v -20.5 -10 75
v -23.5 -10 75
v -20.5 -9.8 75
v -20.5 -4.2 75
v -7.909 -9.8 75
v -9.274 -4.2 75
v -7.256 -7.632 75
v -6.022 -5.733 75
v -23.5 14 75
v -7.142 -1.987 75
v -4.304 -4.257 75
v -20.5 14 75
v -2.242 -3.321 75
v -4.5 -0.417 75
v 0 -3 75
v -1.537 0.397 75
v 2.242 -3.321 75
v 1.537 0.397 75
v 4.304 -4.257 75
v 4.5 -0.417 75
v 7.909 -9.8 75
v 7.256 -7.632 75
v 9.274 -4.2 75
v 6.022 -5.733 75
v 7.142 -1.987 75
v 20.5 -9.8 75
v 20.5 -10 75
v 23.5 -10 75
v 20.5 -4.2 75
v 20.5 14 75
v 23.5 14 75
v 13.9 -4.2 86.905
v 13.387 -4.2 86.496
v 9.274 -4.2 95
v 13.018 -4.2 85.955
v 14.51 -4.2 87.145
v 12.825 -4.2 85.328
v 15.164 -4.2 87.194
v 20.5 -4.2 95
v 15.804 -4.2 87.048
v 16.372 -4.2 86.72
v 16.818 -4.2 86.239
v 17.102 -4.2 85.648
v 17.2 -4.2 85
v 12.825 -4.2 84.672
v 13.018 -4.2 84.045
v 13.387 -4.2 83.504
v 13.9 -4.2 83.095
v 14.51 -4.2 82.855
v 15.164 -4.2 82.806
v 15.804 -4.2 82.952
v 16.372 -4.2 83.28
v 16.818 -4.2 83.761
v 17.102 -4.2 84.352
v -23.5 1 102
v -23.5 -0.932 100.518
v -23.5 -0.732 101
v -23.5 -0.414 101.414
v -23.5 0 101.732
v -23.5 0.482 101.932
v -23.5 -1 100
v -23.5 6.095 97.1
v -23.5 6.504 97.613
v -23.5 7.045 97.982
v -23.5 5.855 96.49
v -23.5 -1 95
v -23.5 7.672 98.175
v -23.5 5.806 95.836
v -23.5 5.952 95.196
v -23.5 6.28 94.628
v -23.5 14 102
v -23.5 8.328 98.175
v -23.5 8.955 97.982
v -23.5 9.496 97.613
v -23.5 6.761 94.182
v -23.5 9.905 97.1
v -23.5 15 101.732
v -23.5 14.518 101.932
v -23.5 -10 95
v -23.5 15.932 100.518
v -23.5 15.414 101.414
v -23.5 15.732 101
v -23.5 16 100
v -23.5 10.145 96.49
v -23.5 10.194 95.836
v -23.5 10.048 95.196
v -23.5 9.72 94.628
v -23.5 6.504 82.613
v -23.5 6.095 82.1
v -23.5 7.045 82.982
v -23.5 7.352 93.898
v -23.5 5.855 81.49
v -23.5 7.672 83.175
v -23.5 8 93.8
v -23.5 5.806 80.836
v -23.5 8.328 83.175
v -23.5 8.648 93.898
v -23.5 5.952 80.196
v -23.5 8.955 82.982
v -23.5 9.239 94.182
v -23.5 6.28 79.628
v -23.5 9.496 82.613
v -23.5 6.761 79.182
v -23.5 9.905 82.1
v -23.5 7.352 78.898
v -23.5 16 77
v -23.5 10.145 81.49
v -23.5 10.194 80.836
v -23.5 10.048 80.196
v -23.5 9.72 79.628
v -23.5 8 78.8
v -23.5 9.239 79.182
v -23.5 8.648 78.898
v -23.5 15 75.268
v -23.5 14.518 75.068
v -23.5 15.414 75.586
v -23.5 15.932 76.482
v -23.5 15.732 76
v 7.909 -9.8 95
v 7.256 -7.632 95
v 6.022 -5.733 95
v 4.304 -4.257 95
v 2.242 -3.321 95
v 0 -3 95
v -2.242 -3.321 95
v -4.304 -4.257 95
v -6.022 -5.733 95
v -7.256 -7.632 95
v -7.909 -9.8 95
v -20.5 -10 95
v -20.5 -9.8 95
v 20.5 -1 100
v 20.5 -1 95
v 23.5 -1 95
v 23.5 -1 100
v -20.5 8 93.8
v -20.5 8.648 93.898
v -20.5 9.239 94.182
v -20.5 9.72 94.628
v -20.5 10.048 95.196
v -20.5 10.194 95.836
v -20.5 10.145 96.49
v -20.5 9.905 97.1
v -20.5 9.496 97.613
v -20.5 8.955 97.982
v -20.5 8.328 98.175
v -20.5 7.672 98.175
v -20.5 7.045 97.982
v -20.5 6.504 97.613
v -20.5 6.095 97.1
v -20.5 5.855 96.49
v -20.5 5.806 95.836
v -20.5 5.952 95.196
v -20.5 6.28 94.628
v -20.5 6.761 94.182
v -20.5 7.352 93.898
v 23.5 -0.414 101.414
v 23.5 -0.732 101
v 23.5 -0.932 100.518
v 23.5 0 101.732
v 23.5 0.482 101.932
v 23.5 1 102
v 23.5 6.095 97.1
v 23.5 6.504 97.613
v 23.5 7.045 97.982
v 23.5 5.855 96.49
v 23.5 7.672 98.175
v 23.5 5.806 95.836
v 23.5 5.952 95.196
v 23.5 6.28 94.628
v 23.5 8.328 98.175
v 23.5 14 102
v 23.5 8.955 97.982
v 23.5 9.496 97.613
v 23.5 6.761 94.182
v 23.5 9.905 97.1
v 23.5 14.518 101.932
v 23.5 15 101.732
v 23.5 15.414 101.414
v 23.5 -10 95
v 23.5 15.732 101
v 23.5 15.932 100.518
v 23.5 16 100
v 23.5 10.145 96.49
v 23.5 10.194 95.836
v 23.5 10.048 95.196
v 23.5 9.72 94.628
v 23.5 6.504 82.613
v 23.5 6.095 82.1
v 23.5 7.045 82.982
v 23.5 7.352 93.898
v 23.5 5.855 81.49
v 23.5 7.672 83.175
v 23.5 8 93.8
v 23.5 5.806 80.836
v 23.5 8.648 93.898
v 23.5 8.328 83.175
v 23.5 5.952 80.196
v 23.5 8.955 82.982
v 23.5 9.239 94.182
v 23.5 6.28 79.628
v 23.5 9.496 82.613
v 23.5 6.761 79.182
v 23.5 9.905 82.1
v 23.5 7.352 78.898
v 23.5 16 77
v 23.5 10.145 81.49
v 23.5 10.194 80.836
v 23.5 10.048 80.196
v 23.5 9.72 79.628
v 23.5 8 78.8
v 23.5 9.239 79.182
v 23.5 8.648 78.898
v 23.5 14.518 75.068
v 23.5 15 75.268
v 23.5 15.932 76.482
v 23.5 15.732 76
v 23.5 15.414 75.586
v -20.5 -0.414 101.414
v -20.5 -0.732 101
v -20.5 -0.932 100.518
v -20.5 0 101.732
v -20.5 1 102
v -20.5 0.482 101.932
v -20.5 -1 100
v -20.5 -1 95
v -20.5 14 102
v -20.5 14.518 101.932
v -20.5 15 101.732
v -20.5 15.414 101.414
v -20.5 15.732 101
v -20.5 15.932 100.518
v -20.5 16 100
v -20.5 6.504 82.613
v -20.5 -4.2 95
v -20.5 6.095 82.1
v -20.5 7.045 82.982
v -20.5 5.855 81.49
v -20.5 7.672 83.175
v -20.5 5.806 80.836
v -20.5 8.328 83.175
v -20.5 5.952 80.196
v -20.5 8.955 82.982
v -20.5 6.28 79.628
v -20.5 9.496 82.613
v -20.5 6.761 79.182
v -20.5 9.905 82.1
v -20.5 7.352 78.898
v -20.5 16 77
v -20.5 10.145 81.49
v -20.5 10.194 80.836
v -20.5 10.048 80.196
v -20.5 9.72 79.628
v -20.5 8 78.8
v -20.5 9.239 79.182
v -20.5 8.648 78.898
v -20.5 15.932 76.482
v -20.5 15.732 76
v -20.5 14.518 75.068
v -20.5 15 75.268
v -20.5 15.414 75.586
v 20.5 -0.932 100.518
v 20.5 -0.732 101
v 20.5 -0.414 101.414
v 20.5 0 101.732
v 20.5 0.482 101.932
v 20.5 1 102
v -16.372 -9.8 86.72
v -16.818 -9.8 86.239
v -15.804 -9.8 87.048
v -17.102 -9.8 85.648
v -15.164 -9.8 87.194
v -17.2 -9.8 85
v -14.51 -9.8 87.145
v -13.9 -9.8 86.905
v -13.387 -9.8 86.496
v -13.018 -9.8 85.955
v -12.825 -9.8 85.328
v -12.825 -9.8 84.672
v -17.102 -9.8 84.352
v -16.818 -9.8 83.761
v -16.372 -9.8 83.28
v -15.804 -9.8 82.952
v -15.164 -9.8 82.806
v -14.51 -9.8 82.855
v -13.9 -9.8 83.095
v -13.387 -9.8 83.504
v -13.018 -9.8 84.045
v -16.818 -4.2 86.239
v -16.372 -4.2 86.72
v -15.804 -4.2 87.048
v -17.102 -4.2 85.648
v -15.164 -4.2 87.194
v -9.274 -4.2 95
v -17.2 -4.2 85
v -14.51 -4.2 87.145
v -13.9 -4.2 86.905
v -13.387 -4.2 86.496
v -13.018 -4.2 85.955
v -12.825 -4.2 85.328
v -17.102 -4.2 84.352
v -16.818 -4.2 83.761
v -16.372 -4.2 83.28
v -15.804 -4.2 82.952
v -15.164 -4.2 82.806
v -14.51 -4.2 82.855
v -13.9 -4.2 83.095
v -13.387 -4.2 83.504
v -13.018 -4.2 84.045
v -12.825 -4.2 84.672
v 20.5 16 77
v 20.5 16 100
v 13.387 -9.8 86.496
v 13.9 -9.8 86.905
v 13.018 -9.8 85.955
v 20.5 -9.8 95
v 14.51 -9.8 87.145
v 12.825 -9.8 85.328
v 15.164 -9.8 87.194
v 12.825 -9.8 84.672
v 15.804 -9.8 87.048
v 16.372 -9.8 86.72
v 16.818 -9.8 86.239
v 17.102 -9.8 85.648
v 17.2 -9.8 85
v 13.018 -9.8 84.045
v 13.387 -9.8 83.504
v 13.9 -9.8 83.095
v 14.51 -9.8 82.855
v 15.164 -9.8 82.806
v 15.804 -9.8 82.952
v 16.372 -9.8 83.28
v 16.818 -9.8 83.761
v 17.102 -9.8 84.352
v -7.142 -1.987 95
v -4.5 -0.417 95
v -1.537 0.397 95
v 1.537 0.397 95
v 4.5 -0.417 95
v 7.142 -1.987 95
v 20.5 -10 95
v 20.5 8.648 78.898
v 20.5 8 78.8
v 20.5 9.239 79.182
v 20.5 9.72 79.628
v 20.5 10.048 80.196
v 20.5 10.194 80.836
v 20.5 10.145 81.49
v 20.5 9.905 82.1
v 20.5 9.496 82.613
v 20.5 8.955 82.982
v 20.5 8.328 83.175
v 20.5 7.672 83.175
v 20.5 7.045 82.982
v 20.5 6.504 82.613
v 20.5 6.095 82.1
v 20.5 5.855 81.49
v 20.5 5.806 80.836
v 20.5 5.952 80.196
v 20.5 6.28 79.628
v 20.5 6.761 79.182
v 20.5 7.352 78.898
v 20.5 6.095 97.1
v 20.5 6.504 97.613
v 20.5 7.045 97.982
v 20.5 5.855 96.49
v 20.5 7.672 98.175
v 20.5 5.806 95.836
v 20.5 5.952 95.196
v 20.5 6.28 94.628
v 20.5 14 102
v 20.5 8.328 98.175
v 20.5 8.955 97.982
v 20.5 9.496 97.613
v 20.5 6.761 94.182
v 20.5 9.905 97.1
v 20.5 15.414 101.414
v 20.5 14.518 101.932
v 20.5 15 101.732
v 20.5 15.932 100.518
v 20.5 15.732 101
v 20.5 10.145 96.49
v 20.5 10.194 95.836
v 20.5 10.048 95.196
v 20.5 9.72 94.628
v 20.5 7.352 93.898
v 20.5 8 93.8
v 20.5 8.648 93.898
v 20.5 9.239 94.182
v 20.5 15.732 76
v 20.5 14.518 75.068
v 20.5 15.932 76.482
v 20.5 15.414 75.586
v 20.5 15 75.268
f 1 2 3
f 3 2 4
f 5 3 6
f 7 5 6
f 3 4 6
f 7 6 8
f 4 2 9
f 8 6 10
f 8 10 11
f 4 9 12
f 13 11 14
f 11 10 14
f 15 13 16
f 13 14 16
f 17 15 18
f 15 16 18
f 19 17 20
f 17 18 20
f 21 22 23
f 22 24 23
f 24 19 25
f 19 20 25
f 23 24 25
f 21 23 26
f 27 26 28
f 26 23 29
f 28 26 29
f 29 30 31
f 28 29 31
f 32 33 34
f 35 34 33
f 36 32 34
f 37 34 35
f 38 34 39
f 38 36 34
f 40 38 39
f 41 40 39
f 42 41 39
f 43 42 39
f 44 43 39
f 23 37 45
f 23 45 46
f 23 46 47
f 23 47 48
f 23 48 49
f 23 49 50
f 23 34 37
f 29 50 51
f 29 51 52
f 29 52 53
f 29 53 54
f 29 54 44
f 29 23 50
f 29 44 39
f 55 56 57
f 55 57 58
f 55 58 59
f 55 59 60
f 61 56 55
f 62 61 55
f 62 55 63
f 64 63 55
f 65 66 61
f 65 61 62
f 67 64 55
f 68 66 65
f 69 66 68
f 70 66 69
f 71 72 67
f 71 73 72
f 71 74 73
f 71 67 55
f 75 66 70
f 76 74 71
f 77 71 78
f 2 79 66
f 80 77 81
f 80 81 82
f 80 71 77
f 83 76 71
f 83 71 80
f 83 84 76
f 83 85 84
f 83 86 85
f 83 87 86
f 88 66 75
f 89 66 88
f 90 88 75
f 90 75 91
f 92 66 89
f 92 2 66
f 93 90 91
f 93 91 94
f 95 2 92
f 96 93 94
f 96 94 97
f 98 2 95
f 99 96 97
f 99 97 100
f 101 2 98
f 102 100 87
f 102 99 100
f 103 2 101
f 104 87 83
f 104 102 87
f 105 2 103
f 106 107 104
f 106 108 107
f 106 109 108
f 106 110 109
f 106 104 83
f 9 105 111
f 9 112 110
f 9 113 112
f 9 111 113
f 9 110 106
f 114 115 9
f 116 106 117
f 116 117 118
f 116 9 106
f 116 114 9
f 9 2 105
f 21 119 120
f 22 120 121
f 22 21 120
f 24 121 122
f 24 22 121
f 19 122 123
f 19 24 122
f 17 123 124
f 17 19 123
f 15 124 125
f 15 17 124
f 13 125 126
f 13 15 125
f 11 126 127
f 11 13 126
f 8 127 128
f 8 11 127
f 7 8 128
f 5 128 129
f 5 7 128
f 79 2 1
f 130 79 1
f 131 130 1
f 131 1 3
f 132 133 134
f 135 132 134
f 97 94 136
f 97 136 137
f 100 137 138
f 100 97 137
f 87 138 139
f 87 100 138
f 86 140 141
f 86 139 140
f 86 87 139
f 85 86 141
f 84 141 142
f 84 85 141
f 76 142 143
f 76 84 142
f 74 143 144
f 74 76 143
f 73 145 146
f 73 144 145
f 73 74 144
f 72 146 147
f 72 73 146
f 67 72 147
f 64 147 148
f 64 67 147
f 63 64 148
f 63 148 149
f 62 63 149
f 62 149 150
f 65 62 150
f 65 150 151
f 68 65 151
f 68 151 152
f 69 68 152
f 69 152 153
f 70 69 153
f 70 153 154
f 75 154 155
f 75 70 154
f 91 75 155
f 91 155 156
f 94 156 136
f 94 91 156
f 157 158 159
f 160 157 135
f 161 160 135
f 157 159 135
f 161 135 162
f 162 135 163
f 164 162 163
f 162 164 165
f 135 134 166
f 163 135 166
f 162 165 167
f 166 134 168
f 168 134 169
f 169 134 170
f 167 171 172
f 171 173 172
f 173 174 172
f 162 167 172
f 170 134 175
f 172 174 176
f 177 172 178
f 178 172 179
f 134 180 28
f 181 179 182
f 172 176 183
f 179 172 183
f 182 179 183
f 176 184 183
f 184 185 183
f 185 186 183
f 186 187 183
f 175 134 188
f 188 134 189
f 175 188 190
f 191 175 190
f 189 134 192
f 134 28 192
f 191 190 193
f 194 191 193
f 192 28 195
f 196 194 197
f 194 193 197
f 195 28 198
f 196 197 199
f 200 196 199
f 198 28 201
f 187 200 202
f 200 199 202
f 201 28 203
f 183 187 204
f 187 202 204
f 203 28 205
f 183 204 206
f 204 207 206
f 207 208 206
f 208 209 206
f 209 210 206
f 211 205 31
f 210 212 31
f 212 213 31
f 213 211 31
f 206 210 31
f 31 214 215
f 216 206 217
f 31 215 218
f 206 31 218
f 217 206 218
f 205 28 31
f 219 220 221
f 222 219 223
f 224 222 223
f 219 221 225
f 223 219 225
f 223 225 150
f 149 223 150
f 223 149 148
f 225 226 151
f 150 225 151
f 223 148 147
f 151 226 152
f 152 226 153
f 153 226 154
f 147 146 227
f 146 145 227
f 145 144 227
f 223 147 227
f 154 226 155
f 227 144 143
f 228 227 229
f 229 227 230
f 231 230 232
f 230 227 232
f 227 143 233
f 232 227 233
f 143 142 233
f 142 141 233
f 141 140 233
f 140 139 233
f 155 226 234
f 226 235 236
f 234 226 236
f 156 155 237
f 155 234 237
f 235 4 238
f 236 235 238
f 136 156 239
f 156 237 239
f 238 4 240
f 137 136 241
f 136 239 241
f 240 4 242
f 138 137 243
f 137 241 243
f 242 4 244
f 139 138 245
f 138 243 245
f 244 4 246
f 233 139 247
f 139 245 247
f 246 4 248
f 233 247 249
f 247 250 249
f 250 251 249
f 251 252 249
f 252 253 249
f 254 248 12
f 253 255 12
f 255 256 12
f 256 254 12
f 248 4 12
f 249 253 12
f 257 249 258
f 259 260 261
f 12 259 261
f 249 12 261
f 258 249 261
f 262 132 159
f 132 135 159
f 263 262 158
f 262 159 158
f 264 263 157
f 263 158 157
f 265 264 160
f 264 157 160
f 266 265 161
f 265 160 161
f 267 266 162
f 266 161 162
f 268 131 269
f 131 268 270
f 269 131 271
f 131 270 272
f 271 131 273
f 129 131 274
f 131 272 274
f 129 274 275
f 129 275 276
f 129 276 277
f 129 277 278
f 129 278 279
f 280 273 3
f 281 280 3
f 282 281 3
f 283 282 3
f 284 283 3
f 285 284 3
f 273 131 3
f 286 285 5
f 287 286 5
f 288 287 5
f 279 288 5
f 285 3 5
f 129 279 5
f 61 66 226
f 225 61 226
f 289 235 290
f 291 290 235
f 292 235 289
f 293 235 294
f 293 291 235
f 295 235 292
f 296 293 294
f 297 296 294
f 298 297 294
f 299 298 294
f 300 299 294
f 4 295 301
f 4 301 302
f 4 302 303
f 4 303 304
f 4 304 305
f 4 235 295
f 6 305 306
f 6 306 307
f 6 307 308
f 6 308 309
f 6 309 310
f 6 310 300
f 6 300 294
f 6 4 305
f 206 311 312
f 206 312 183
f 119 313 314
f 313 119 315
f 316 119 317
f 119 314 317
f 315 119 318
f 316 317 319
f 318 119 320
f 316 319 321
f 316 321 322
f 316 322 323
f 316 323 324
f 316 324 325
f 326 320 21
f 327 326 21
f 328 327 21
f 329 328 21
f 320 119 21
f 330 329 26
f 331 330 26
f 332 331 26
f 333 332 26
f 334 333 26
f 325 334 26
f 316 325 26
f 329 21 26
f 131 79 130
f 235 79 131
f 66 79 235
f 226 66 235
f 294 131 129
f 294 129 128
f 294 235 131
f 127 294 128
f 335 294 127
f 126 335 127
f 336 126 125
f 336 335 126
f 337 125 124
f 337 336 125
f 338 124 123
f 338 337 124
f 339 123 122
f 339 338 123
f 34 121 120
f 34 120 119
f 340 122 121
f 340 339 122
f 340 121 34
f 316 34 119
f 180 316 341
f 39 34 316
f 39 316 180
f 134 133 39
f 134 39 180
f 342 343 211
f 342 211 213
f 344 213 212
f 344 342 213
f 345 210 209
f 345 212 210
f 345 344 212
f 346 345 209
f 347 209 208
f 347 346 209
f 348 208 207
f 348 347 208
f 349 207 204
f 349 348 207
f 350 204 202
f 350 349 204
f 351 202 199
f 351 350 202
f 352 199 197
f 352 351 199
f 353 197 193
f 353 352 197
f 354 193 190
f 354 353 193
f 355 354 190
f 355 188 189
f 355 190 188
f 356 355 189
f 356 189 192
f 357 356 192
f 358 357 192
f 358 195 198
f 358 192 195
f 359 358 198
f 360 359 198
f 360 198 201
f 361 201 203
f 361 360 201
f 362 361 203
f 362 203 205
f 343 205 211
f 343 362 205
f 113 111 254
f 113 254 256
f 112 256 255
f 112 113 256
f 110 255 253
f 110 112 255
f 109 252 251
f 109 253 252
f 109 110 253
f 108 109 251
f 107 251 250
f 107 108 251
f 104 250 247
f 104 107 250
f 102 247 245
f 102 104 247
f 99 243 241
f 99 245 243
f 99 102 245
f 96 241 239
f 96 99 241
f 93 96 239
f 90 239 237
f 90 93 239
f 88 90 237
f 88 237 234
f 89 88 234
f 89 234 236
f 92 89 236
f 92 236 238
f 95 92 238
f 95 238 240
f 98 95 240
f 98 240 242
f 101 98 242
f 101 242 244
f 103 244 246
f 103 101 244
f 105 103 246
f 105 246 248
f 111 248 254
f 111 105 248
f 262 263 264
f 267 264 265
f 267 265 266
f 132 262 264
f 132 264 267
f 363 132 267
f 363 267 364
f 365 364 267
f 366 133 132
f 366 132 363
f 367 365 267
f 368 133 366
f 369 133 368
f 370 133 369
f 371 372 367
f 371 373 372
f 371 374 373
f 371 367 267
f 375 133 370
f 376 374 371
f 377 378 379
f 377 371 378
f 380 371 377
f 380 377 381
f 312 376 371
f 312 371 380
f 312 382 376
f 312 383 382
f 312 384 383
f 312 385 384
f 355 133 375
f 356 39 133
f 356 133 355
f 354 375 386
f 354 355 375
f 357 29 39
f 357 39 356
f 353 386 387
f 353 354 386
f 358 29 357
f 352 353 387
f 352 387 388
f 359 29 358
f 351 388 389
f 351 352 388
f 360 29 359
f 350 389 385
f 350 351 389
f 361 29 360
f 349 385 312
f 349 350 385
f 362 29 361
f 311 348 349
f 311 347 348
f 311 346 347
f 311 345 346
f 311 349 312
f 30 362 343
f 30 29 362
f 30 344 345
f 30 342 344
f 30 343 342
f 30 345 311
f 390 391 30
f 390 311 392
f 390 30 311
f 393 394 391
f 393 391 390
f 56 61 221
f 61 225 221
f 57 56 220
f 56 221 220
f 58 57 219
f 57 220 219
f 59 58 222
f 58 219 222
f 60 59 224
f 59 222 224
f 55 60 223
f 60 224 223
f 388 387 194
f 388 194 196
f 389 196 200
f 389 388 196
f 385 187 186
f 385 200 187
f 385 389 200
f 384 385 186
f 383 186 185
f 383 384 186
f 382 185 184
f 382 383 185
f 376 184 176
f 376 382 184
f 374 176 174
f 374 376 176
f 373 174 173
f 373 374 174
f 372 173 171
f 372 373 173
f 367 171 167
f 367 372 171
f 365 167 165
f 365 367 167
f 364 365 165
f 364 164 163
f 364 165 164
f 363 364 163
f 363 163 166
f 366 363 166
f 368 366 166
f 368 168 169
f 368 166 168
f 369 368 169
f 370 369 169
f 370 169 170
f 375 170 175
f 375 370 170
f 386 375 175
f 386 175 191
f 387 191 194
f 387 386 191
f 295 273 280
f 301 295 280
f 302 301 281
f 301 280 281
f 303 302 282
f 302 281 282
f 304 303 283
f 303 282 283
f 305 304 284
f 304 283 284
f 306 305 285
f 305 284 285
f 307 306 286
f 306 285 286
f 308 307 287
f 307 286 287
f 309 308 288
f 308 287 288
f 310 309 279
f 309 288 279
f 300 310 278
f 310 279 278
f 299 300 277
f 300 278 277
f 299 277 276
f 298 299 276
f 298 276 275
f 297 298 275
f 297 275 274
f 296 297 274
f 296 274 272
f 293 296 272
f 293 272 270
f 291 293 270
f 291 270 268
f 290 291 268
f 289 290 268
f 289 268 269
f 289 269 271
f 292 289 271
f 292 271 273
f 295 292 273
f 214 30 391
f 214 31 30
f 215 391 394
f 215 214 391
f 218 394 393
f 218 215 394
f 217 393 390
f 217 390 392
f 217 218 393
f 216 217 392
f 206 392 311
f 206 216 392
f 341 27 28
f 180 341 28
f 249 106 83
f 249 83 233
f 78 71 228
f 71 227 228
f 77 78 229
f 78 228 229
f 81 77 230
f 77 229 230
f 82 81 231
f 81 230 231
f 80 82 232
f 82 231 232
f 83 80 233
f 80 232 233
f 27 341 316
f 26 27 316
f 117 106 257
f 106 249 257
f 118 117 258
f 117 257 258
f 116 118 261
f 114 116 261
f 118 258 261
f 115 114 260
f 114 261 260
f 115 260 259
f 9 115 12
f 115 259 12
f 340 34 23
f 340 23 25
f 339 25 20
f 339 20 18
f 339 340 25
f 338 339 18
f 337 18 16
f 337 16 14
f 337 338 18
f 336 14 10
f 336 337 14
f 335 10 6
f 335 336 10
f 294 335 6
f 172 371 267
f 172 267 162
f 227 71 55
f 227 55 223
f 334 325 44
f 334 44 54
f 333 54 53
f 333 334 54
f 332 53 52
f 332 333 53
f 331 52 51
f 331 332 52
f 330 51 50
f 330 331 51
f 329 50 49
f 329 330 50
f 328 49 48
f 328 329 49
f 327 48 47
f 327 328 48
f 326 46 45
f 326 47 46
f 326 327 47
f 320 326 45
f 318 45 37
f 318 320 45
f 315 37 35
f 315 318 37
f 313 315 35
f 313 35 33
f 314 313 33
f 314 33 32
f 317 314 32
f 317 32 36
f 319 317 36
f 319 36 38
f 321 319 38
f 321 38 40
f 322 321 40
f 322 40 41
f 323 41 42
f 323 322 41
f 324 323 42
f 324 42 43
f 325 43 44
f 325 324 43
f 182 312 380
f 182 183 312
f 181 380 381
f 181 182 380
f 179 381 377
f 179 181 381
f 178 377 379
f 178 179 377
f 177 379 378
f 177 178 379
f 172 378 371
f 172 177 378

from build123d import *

# Parameters (mm, degrees)
CYLINDER103_R               = 2.2
CYLINDER103_DEPTH           = 30
CYLINDER099_R               = 2.2
CYLINDER099_DEPTH           = 100
ARRAY001_Z_COUNT            = 4
ARRAY001_Z_PITCH            = 15
BOX048_W                    = 3
BOX048_H                    = 10
BOX048_DEPTH                = 20
BOX_W                       = 3
BOX_H                       = 17
BOX_DEPTH                   = 27
ARRAY_X_COUNT               = 2
ARRAY_X_PITCH               = 44
CYLINDER097_R               = 8
CYLINDER097_DEPTH           = 20
CYLINDER097_PLACEMENT_ANGLE = 10
BOX047_W                    = 47
BOX047_H                    = 5.6
BOX047_DEPTH                = 20
CYLINDER096_W               = 11.5
CYLINDER096_H               = 20
CYLINDER096_ANGLE           = 160
CYLINDER096_PLACEMENT_ANGLE = 10
FILLET_R                    = 2


with BuildPart() as insert_hole:
    # Cylinder103 → Cylinder103 (new body)
    with BuildSketch(Plane(origin=(15, -19, 10), x_dir=(1, 0, 0), z_dir=(0, 1, 0))):
        Circle(CYLINDER103_R)
    extrude(amount=CYLINDER103_DEPTH)


with BuildPart() as m3_bolt_insert_fusion001:
    # Part__Mirroring007: instance of insert hole
    add(insert_hole.part.mirror(Plane(origin=(0, 0, 0), x_dir=(0, -1, 0), z_dir=(1, 0, 0))))

    # Fusion076: union insert hole
    add(insert_hole.part)


with BuildPart() as m4_hole_array:
    # Cylinder099 → Cylinder099 (new body)
    with BuildSketch(Plane(origin=(-50, 9, 6), x_dir=(0, 0, -1), z_dir=(1, 0, 0))):
        Circle(CYLINDER099_R)
    extrude(amount=CYLINDER099_DEPTH)

    # Array001 Z: m4 hole array ×4


with BuildPart() as m4_hole_array_1:
    add(m4_hole_array.part)
    with Locations(*[(0, 0, i * ARRAY001_Z_PITCH) for i in range(1, ARRAY001_Z_COUNT)]):
        add(m4_hole_array.part)


with BuildPart() as wall_cube001:
    # Box048 → Box048 (new body)
    with BuildSketch(Plane(origin=(0, -9, 0), x_dir=(1, 0, 0), z_dir=(0, 0, 1))):
        with Locations((1.5, 5)):
            Rectangle(BOX048_W, BOX048_H)
    extrude(amount=BOX048_DEPTH)


with BuildPart() as walls_with_holes:
    # Box → Box (new body)
    with BuildSketch(Plane.XY):
        with Locations((1.5, 8.5)):
            Rectangle(BOX_W, BOX_H)
    extrude(amount=BOX_DEPTH)

    # Fusion: union wall cube001
    add(wall_cube001.part)


with BuildPart() as walls_with_holes_1:
    # Fusion placement: moved
    add(walls_with_holes.part.moved(Location((-23.5, 0, 0))))

    # Array X: walls with holes ×2


with BuildPart() as walls_with_holes_2:
    add(walls_with_holes_1.part)
    with Locations(*[(i * ARRAY_X_PITCH, 0, 0) for i in range(1, ARRAY_X_COUNT)]):
        add(walls_with_holes_1.part)

    # Cut: cut m4 hole array
    add(m4_hole_array_1.part, mode=Mode.SUBTRACT)


with BuildPart() as walls_with_holes_3:
    # Cut placement: moved
    add(walls_with_holes_2.part.moved(Location((0, 10, 0))))


with BuildPart() as pile_extraction001:
    # Cylinder097 → Cylinder097 (new body)
    with BuildSketch(Plane.XY):
        Circle(CYLINDER097_R)
    extrude(amount=CYLINDER097_DEPTH)


with BuildPart() as pile_extraction001_1:
    # Cylinder097 placement: moved
    add(pile_extraction001.part.rotate(Axis((0, 0, 0), (0, 0, 1)), CYLINDER097_PLACEMENT_ANGLE))


with BuildPart() as cube004:
    # Box047 → Box047 (new body)
    with BuildSketch(Plane(origin=(-23.5, 1.2, 0), x_dir=(1, 0, 0), z_dir=(0, 0, 1))):
        with Locations((23.5, 2.8)):
            Rectangle(BOX047_W, BOX047_H)
    extrude(amount=BOX047_DEPTH)


with BuildPart() as solder_with_walls_fillet_clone:
    # Cylinder096 → Cylinder096 (revolve)
    with BuildSketch(Plane.XZ):
        with Locations((5.75, 10)):
            Rectangle(CYLINDER096_W, CYLINDER096_H)
    revolve(axis=Axis((0, 0, 0), (0, 0, 1)), revolution_arc=CYLINDER096_ANGLE)


with BuildPart() as solder_with_walls_fillet_clone_1:
    # Cylinder096 placement: moved
    add(solder_with_walls_fillet_clone.part.rotate(Axis((0, 0, 0), (0, 0, 1)), CYLINDER096_PLACEMENT_ANGLE))

    # Fusion072: union Cube004
    add(cube004.part)

    # Cut023016: cut pile extraction001
    add(pile_extraction001_1.part, mode=Mode.SUBTRACT)

    # Fusion073: union walls with holes
    add(walls_with_holes_3.part)

    # Cut023015: cut m3 bolt insert fusion001
    add(m3_bolt_insert_fusion001.part, mode=Mode.SUBTRACT)


with BuildPart() as solder_with_walls_fillet_clone_2:
    # Cut023015 placement: moved
    add(solder_with_walls_fillet_clone_1.part.moved(Location((0, -11, 0))))

    # Fillet
    fillet_edges = [solder_with_walls_fillet_clone_2.edges().sort_by_distance(p)[0] for p in [
        (-22, -1, 27),
        (-22, 16, 27),
        (-22, 16, 0),
        (22, -1, 27),
        (22, 16, 27),
        (22, 16, 0),
    ]]
    fillet(fillet_edges, radius=FILLET_R)


with BuildPart() as solder_with_walls_fillet_clone_3:
    # Body placement: moved
    add(solder_with_walls_fillet_clone_2.part.moved(Location((0, 0, 75))))


solid = solder_with_walls_fillet_clone_3.part
